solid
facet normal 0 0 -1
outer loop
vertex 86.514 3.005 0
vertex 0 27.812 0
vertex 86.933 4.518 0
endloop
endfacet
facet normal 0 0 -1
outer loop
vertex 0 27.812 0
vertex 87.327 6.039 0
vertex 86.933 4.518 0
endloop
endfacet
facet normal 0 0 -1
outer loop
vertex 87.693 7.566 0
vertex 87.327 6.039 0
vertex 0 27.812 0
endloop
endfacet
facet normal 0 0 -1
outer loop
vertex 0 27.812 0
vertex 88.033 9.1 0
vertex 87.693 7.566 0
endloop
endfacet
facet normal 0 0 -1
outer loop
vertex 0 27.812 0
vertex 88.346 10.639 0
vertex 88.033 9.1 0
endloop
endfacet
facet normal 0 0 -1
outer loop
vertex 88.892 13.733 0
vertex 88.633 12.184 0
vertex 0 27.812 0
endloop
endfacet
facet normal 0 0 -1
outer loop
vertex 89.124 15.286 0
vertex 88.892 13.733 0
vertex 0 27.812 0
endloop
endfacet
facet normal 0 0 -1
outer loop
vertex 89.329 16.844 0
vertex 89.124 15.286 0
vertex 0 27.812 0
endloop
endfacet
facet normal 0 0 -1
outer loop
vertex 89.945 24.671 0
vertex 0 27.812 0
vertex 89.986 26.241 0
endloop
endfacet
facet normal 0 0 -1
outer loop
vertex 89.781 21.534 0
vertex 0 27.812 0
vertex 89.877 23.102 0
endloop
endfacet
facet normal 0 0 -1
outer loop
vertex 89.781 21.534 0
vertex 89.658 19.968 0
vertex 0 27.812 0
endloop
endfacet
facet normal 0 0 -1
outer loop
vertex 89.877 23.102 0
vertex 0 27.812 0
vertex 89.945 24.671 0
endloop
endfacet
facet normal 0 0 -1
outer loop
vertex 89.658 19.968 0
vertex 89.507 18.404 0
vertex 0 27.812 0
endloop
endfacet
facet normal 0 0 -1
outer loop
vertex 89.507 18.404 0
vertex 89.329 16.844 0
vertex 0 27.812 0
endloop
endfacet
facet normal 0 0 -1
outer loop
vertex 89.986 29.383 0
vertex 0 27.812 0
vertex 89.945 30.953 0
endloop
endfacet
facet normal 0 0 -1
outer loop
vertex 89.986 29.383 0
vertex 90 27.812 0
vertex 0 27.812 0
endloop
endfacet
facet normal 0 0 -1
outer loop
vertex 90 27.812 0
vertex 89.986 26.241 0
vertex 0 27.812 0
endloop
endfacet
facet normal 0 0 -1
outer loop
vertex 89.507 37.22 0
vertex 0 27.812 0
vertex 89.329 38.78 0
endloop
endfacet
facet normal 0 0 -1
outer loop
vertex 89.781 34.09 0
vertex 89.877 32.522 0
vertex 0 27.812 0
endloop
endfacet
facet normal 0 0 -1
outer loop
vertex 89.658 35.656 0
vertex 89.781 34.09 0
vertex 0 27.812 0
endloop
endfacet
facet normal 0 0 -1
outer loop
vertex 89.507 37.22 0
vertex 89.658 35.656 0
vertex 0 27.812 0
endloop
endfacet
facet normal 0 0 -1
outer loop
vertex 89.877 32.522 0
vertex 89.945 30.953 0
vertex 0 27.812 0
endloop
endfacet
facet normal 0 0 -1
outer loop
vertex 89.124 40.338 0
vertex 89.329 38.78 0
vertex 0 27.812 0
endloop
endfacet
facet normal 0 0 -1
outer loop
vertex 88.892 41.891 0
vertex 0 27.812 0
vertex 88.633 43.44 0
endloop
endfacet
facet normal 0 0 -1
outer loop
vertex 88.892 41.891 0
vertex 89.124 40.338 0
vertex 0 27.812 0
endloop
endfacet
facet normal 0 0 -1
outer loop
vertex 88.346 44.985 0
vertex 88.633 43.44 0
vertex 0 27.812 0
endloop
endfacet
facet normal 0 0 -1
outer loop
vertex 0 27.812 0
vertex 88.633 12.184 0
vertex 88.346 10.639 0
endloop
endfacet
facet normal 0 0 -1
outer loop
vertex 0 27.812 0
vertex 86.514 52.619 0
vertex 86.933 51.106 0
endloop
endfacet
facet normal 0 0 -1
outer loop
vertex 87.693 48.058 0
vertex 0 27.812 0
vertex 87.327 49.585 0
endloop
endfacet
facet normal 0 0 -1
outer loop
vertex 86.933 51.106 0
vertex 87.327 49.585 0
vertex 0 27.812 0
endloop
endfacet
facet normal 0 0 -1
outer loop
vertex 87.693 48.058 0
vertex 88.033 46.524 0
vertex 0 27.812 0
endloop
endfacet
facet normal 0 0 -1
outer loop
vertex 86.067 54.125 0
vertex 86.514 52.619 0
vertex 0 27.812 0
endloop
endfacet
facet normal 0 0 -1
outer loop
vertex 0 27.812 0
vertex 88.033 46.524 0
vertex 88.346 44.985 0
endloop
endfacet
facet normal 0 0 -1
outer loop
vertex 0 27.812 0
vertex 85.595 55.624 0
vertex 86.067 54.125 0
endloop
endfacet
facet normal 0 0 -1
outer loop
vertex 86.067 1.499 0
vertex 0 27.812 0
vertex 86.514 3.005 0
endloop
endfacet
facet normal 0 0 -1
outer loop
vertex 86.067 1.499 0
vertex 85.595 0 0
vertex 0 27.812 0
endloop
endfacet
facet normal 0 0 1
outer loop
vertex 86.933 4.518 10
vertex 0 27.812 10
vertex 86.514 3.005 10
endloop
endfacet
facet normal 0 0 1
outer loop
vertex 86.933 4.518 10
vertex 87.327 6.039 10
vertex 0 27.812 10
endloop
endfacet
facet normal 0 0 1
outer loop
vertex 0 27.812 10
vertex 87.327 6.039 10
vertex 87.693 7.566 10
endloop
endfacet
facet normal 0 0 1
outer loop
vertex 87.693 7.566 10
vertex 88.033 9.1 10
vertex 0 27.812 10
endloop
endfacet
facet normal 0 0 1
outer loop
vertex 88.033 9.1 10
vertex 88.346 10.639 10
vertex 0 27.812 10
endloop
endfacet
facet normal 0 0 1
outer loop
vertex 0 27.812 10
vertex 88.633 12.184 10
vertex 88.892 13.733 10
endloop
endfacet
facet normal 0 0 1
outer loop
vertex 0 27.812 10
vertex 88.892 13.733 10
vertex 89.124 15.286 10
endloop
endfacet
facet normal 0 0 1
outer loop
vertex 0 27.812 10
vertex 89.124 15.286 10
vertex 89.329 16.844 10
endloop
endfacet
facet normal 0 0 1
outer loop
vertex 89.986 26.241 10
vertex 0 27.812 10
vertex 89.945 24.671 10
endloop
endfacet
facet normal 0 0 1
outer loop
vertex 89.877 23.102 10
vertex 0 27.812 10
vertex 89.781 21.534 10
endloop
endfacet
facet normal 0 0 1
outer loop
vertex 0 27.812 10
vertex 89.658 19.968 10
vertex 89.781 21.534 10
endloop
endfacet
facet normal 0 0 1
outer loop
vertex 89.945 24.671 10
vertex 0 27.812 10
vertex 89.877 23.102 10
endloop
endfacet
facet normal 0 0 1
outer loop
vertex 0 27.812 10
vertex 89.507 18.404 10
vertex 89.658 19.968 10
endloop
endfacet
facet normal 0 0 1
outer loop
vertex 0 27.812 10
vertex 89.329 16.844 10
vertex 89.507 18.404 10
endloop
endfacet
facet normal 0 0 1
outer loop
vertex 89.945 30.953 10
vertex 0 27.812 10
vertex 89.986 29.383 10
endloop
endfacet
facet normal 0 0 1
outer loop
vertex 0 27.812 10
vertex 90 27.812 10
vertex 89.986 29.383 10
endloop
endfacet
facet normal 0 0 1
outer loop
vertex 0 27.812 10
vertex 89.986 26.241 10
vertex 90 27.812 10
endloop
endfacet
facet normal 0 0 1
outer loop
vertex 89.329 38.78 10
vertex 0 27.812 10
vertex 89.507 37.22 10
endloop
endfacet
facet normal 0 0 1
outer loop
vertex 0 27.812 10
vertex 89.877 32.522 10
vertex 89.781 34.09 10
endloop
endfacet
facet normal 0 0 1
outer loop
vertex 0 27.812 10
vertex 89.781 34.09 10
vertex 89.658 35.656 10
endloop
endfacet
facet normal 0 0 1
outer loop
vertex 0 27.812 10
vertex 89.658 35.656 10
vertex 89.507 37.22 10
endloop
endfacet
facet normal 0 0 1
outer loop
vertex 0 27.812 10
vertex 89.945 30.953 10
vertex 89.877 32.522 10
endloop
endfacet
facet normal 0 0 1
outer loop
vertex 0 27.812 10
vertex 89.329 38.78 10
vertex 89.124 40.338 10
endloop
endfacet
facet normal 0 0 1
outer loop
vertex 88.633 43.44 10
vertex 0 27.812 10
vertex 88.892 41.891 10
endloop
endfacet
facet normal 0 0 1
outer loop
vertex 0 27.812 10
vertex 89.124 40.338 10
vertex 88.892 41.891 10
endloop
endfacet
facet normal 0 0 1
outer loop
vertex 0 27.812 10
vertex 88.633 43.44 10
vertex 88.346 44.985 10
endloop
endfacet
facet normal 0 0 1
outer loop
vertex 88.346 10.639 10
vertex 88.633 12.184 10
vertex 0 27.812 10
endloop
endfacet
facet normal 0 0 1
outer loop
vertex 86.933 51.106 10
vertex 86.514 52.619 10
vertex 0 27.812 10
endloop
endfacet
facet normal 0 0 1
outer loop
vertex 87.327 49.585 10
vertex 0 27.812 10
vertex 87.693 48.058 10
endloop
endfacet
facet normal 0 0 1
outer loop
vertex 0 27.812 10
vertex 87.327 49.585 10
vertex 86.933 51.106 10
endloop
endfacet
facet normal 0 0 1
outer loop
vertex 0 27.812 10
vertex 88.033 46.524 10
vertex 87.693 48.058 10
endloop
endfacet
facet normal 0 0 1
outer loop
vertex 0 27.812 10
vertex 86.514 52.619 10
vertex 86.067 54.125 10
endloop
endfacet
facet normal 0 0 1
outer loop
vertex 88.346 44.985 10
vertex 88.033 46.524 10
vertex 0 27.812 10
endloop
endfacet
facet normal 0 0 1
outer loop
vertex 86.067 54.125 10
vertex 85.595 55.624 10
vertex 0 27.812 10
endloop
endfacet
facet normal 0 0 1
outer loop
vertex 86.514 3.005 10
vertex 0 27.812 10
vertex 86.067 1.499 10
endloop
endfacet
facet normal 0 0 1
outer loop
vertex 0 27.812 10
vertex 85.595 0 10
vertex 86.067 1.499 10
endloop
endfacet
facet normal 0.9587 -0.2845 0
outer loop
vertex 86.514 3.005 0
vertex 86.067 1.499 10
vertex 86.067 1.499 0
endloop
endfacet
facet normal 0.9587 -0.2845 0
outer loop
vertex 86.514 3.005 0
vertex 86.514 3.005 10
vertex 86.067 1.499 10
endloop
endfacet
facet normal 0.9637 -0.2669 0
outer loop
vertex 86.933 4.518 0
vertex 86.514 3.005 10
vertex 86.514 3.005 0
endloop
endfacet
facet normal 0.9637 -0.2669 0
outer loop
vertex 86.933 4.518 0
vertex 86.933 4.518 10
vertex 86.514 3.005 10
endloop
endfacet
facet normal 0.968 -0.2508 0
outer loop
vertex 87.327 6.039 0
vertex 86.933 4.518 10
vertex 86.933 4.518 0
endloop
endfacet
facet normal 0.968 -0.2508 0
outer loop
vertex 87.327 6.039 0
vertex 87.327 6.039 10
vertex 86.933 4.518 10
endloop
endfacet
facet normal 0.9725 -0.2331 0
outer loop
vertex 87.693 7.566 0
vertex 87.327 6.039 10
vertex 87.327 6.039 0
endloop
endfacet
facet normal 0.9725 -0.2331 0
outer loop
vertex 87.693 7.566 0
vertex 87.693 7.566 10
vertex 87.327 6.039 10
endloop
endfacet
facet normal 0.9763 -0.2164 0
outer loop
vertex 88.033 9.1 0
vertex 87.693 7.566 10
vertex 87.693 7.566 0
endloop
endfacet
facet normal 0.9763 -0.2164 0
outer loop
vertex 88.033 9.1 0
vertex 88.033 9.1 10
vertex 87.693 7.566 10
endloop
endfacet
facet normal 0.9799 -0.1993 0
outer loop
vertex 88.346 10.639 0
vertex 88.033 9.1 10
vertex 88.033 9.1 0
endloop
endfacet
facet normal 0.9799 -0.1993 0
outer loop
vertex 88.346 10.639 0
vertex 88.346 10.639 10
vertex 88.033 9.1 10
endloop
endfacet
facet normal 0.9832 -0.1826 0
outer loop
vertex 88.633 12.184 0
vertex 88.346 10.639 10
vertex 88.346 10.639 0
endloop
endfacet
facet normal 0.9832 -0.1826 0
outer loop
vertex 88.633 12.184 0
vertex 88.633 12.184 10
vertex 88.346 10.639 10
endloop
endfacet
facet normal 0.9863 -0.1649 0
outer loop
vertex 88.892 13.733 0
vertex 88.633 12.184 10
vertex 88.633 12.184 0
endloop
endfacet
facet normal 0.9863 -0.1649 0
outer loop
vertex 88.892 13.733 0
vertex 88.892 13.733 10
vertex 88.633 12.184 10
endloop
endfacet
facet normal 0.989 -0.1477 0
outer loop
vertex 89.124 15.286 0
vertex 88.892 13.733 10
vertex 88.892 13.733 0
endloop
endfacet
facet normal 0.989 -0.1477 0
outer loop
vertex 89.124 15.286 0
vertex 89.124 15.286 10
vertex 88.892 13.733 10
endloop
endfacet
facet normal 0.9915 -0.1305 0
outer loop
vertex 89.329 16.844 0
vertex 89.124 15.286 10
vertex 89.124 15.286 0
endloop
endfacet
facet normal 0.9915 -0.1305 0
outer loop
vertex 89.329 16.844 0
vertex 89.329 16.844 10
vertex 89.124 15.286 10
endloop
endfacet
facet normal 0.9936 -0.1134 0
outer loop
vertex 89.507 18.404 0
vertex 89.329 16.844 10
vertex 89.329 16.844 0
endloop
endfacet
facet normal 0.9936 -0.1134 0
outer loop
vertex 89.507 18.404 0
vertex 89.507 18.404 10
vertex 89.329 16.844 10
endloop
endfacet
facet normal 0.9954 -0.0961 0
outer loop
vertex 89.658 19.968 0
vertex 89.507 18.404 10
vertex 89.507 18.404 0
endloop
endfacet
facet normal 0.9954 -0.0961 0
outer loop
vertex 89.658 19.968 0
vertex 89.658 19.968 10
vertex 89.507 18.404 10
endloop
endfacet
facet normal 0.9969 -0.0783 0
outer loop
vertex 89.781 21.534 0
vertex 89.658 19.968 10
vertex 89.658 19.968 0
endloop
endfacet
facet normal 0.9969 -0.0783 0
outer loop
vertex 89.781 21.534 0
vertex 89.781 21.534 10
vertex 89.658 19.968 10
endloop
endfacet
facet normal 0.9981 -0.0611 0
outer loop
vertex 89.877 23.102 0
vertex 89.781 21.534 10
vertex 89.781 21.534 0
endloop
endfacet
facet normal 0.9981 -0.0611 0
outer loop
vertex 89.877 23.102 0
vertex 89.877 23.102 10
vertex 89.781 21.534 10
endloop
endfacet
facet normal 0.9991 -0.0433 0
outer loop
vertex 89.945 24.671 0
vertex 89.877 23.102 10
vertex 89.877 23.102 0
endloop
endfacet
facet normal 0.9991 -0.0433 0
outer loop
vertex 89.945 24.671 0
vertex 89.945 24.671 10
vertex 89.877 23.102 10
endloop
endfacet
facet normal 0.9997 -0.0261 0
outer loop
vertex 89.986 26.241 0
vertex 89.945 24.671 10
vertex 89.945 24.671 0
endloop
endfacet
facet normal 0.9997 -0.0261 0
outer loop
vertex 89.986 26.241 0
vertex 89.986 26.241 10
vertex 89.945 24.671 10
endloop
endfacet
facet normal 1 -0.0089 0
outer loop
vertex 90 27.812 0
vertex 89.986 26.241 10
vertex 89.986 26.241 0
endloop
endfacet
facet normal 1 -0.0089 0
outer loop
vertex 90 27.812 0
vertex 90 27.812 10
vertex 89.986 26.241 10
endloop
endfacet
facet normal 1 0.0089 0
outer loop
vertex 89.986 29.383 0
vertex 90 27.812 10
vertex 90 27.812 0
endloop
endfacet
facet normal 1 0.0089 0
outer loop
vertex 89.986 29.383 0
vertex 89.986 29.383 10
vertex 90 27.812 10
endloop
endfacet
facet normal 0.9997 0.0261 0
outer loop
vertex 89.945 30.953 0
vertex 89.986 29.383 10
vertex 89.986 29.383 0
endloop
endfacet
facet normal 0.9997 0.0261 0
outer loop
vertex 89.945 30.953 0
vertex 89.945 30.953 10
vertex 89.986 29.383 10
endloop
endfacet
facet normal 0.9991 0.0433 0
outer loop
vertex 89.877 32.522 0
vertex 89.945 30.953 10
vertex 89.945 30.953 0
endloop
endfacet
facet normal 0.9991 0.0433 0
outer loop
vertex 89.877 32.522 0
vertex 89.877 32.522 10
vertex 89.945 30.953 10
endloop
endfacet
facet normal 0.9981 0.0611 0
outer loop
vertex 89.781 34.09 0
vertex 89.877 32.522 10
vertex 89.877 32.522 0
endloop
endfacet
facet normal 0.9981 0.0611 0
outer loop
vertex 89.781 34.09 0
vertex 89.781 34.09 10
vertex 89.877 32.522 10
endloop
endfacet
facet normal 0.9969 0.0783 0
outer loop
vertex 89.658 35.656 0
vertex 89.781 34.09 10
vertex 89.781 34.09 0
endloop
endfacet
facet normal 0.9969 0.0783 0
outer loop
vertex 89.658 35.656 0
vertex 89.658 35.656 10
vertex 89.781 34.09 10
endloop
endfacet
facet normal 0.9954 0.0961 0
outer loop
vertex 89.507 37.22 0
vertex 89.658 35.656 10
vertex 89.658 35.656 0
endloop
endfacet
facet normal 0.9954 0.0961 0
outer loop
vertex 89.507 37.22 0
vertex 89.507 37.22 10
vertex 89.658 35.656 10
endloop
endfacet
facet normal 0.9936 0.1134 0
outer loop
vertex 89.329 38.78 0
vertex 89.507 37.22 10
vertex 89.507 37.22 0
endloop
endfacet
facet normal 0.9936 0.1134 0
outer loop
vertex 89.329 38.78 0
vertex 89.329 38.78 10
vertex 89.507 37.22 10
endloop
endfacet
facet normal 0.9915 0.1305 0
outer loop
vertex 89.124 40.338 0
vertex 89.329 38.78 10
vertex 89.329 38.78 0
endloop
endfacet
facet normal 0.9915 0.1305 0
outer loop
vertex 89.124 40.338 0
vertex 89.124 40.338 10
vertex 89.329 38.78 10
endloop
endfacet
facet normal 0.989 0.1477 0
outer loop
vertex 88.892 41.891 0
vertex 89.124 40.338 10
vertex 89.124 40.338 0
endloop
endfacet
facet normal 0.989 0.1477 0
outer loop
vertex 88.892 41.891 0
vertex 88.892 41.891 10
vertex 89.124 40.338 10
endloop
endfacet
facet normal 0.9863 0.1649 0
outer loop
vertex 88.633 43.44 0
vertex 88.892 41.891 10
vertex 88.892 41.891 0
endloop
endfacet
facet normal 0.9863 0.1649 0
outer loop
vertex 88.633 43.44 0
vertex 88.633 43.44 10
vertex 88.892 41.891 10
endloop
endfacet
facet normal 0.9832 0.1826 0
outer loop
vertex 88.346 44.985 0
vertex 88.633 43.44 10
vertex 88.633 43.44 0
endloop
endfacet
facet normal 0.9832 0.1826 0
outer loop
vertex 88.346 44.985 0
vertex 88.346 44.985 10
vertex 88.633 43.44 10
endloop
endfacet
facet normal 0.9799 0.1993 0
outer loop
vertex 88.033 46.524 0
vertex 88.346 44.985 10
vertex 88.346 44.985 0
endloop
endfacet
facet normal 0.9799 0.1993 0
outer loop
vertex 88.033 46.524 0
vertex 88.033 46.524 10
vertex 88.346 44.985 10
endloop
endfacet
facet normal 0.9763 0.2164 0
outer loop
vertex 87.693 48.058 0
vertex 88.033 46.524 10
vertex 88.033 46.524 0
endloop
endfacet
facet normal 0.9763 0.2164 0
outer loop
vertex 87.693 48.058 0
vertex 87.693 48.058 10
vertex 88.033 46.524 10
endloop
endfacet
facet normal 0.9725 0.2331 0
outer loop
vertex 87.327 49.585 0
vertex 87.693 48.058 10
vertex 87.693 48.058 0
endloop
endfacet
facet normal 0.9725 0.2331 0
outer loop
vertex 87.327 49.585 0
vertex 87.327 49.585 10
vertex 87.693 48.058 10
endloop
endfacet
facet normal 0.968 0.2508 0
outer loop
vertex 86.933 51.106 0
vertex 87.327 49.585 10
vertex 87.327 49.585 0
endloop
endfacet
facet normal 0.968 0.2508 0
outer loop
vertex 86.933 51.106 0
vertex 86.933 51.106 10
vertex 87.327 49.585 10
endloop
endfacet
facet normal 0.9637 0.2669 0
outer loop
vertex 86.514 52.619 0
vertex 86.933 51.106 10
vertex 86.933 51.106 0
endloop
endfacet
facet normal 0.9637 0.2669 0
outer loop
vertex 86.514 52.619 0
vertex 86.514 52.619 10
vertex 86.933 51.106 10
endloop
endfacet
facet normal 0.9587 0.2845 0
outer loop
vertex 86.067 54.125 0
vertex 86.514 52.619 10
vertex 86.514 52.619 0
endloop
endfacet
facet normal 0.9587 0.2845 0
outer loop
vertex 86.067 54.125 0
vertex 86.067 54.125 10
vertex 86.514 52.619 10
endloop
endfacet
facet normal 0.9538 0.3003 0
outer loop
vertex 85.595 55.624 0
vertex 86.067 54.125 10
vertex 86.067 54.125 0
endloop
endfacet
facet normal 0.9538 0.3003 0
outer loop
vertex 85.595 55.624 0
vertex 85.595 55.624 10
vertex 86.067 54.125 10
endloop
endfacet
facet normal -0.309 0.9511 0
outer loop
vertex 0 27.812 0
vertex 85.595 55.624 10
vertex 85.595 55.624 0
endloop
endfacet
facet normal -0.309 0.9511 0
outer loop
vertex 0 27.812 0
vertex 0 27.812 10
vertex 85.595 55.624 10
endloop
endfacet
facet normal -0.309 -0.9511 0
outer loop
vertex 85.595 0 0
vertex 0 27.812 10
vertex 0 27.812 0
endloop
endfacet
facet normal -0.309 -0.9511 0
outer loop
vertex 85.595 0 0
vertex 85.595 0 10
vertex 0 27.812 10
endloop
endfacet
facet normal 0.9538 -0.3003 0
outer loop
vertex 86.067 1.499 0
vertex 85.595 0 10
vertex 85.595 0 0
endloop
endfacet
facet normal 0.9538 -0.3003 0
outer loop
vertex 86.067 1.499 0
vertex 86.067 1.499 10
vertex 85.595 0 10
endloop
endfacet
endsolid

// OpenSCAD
$fn = 32;

// ----------------------------------------------------------------------
// Arc profile plate: sector, 38 points
// ----------------------------------------------------------------------

// --- parameters (mm) ---
sector_angle = 36;        // sector angle, degrees
sector_r = 90;            // outer radius
arc_step = 1;             // sampling step of the arc, degrees
plate_t = 10;             // plate thickness, Z

bbox_x = 2 * sector_r * sin(sector_angle / 2);  // chord of the sector
bbox_y = sector_r;  // depth of the sector (apex to arc)

profile = [[85.595, 0], [86.067, 1.499], [86.514, 3.005], [86.933, 4.518], [87.327, 6.039], [87.693, 7.566], [88.033, 9.1], [88.346, 10.639], [88.633, 12.184], [88.892, 13.733], [89.124, 15.286], [89.329, 16.844], [89.507, 18.404], [89.658, 19.968], [89.781, 21.534], [89.877, 23.102], [89.945, 24.671], [89.986, 26.241], [90, 27.812], [89.986, 29.383], [89.945, 30.953], [89.877, 32.522], [89.781, 34.09], [89.658, 35.656], [89.507, 37.22], [89.329, 38.78], [89.124, 40.338], [88.892, 41.891], [88.633, 43.44], [88.346, 44.985], [88.033, 46.524], [87.693, 48.058], [87.327, 49.585], [86.933, 51.106], [86.514, 52.619], [86.067, 54.125], [85.595, 55.624], [0, 27.812]];  // primary outline, 38 points, counter clockwise

// --- the one profile operation ---
linear_extrude(height = plate_t) polygon(points = profile);
